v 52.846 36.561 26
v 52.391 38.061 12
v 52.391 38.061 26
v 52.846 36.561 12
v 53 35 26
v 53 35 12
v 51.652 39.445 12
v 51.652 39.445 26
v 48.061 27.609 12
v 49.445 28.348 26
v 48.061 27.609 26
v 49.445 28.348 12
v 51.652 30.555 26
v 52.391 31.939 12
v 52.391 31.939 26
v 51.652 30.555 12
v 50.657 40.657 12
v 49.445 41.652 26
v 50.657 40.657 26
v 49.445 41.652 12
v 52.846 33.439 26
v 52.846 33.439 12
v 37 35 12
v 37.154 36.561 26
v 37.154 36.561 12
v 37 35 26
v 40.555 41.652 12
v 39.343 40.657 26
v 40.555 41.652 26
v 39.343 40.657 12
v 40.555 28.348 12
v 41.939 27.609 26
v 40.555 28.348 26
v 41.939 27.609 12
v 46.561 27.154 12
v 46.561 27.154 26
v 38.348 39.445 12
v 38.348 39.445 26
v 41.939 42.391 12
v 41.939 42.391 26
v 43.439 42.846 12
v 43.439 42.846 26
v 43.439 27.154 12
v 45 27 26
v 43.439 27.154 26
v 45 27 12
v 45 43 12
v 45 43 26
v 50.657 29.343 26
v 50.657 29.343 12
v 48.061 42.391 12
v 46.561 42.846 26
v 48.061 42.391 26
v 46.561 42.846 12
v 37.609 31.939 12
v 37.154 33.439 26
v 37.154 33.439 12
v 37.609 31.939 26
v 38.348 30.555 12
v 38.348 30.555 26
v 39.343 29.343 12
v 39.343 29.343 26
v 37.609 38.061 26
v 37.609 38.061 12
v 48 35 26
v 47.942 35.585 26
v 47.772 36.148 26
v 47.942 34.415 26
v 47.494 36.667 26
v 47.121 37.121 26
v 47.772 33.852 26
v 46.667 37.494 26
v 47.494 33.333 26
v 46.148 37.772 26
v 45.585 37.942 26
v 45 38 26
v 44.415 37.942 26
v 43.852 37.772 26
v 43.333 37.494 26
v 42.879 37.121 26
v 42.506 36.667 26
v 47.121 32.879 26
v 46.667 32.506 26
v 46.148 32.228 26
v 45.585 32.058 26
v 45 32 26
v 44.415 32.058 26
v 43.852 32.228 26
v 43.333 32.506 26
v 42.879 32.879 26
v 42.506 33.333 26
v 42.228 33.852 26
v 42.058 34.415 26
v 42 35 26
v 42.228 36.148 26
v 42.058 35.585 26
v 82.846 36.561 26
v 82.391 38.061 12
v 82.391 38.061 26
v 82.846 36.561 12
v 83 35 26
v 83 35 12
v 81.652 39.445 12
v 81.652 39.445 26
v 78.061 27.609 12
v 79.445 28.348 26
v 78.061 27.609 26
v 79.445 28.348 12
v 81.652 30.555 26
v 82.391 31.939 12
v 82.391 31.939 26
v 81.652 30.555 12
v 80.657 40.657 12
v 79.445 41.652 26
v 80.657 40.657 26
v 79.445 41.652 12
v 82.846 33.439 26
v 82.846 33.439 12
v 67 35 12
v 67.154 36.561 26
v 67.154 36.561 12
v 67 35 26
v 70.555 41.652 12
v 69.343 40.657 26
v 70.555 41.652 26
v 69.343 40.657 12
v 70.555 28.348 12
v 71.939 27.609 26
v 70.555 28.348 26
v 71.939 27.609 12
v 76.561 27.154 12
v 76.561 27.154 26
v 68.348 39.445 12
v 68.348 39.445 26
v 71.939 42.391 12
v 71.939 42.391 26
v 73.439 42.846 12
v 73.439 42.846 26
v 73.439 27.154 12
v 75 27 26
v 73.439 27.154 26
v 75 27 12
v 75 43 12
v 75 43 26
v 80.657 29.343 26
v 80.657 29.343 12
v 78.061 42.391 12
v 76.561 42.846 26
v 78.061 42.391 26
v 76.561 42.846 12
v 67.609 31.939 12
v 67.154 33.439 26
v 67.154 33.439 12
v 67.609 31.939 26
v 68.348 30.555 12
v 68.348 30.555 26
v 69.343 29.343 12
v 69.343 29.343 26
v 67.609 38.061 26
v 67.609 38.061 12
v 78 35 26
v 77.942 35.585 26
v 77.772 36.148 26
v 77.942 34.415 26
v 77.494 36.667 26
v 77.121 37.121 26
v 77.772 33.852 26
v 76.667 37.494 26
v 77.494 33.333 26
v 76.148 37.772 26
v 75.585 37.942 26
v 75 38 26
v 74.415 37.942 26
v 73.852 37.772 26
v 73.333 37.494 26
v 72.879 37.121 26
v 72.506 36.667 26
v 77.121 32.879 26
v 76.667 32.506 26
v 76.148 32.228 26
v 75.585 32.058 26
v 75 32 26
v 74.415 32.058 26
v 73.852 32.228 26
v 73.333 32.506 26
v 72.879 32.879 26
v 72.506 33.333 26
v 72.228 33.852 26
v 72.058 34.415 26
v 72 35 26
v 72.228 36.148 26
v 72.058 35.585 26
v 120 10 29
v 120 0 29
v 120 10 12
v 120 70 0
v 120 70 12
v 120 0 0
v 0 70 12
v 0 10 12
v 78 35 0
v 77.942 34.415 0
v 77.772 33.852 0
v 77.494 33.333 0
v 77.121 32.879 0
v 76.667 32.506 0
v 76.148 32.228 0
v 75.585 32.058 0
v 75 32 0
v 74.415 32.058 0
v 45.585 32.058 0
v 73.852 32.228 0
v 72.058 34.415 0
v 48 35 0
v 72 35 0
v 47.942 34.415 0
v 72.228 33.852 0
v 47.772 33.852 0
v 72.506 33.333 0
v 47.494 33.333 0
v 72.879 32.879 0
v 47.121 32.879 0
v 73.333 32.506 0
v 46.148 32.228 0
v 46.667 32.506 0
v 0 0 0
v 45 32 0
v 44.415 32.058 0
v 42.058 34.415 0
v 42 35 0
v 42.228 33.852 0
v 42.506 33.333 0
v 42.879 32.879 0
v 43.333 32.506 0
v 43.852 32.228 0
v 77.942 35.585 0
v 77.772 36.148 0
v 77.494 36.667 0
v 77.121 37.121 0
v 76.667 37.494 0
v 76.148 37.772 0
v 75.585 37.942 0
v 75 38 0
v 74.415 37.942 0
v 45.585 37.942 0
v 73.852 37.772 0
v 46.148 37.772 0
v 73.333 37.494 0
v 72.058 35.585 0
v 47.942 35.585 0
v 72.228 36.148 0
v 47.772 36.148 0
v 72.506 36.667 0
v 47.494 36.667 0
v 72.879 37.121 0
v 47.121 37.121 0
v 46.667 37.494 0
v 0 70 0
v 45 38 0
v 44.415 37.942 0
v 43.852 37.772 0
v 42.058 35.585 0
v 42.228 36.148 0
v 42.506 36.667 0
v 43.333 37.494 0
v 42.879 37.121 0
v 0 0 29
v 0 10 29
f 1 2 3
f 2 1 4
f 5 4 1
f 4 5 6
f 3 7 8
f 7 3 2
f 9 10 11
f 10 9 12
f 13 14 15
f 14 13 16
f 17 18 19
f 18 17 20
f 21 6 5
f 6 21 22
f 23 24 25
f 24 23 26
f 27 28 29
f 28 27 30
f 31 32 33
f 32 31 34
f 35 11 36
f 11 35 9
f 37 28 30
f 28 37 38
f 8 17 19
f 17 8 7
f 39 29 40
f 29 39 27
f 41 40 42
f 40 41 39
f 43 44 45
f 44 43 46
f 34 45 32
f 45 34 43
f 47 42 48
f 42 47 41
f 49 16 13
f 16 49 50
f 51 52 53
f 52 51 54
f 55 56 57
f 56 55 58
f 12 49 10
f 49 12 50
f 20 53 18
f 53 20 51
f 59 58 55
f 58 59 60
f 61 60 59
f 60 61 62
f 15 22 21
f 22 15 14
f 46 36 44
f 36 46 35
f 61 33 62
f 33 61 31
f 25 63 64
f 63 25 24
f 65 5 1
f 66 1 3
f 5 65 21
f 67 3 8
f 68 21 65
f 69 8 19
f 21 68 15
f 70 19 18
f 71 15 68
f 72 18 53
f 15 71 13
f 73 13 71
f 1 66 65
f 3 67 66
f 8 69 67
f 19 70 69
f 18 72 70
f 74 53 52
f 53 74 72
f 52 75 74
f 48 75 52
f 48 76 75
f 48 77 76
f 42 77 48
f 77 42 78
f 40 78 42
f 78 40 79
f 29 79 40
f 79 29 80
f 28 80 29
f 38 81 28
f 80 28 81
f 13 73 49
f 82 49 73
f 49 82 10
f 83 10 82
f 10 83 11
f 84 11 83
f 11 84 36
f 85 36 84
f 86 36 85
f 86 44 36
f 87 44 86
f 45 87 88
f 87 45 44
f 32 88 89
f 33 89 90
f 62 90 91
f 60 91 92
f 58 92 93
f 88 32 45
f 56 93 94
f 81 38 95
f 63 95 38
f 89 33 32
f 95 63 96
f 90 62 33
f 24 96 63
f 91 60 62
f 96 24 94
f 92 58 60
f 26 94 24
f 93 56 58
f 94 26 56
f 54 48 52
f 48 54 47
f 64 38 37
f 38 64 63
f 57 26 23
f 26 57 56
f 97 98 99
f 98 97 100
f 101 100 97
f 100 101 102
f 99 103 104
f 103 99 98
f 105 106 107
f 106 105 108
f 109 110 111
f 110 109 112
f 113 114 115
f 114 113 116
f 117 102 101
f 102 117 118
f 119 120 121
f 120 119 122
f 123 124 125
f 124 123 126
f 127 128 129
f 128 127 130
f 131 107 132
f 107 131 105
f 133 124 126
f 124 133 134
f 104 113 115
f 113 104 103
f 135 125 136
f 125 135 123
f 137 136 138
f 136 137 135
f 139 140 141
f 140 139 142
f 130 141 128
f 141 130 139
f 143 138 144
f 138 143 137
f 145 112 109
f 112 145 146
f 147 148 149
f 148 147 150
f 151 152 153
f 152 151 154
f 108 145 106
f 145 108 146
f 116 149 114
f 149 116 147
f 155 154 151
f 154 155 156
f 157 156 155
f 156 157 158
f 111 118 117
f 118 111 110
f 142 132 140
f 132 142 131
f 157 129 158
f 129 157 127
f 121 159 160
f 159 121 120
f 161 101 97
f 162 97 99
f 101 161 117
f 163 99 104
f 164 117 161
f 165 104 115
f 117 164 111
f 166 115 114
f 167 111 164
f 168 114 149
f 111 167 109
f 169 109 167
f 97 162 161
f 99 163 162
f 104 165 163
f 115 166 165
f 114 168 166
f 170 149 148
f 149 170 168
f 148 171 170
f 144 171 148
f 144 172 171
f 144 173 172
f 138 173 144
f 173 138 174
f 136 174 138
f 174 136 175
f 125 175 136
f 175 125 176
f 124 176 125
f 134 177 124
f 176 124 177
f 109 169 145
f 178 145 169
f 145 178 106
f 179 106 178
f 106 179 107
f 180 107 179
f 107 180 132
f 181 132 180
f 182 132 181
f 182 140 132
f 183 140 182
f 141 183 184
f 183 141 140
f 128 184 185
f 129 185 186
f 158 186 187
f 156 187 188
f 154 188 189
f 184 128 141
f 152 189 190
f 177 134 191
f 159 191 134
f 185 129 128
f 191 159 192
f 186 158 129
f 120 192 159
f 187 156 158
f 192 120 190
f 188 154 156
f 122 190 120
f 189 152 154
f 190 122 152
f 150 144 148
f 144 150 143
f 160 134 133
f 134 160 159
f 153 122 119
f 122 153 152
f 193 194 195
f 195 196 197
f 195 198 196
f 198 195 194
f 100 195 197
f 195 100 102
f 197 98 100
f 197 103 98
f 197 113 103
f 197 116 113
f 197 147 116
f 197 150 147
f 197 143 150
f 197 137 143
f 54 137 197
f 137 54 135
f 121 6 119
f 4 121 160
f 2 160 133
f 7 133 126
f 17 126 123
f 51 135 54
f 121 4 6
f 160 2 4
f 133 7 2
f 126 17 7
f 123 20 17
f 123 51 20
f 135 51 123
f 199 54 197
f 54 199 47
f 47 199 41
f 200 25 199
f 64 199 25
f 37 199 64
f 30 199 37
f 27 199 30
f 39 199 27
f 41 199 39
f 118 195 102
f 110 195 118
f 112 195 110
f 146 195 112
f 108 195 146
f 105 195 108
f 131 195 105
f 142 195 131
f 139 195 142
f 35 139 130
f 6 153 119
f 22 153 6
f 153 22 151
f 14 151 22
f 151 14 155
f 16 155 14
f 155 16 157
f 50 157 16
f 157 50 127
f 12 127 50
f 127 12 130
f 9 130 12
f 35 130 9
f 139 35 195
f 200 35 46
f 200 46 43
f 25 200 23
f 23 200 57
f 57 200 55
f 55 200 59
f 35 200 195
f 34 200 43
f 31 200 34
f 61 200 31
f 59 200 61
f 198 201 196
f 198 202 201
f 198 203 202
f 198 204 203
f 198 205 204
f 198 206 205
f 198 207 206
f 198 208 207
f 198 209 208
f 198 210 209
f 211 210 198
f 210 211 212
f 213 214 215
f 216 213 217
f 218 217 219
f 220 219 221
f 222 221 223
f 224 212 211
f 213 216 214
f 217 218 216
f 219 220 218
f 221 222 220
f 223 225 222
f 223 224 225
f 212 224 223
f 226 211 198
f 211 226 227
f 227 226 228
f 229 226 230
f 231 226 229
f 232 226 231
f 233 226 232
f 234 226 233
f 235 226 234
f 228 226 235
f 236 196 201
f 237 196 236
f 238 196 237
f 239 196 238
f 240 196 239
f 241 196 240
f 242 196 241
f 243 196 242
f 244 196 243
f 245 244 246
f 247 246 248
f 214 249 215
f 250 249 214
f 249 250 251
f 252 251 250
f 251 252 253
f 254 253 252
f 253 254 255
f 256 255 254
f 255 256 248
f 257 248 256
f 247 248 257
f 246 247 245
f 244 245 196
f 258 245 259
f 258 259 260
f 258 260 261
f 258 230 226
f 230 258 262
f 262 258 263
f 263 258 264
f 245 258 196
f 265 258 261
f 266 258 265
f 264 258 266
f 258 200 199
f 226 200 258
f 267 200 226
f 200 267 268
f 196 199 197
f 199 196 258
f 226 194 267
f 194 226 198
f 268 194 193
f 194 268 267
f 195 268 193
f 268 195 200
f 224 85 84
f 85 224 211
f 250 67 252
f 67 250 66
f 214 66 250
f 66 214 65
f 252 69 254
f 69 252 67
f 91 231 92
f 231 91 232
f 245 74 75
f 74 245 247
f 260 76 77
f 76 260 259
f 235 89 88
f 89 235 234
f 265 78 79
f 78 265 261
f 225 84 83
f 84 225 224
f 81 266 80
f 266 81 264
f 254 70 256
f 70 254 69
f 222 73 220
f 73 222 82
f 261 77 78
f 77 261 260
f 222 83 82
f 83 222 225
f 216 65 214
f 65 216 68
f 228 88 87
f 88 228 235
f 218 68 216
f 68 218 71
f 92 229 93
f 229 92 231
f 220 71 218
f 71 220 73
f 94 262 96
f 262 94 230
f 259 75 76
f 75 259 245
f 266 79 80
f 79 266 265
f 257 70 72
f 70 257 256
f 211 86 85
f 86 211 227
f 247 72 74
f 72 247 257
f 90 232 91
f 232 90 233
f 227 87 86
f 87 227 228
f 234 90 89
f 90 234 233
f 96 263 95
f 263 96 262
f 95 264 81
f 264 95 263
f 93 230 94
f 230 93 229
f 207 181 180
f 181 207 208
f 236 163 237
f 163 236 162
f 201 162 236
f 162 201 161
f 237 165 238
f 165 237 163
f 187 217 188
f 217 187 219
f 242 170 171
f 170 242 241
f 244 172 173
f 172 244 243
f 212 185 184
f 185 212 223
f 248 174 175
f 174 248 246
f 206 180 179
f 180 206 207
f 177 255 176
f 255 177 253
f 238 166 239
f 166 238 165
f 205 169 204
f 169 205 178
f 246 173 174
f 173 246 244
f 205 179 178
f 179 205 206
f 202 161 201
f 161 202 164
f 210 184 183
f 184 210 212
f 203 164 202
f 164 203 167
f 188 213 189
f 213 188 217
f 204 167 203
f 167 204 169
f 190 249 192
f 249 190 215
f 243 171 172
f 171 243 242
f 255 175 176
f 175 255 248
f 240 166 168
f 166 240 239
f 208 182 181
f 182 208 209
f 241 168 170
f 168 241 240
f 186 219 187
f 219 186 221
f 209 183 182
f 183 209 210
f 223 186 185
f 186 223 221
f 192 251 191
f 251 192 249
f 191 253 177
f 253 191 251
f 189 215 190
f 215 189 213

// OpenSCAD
$fn = 32;

// ----------------------------------------------------------------------
// Drill jig: fence jig
// ----------------------------------------------------------------------

// --- parameters (mm) ---
plate_l = 120;            // plate length, X
plate_w = 70;             // plate width, Y
plate_t = 12;             // plate thickness
boss_d = 16;              // guide boss diameter
boss_h = 15;              // boss height above the plate
guide_d = 6;              // guide hole diameter
boss_pitch = 30;          // boss pitch
fence_h = 18;             // fence height above the plate
fence_t = 10;             // fence thickness

n_boss = 2;  // guide bosses
boss_x0 = (plate_l - (n_boss - 1) * boss_pitch) / 2;  // first boss X
boss_top = plate_t - 1 + boss_h;  // boss crown height
fence_top = plate_t - 1 + fence_h;  // fence crown height
total_h = max([fence_top, boss_top]);  // overall height

difference() {
  union() {
  cube([plate_l, plate_w, plate_t]);
  for (i = [0 : n_boss - 1])
    translate([boss_x0 + i * boss_pitch, plate_w / 2, plate_t - 1])
      cylinder(h = boss_h, d = boss_d);
  translate([0, 0, plate_t - 1]) cube([plate_l, fence_t, fence_h]);
  }
  for (i = [0 : n_boss - 1])
    translate([boss_x0 + i * boss_pitch, plate_w / 2, -1])
      cylinder(h = plate_t + boss_h, d = guide_d);
}
